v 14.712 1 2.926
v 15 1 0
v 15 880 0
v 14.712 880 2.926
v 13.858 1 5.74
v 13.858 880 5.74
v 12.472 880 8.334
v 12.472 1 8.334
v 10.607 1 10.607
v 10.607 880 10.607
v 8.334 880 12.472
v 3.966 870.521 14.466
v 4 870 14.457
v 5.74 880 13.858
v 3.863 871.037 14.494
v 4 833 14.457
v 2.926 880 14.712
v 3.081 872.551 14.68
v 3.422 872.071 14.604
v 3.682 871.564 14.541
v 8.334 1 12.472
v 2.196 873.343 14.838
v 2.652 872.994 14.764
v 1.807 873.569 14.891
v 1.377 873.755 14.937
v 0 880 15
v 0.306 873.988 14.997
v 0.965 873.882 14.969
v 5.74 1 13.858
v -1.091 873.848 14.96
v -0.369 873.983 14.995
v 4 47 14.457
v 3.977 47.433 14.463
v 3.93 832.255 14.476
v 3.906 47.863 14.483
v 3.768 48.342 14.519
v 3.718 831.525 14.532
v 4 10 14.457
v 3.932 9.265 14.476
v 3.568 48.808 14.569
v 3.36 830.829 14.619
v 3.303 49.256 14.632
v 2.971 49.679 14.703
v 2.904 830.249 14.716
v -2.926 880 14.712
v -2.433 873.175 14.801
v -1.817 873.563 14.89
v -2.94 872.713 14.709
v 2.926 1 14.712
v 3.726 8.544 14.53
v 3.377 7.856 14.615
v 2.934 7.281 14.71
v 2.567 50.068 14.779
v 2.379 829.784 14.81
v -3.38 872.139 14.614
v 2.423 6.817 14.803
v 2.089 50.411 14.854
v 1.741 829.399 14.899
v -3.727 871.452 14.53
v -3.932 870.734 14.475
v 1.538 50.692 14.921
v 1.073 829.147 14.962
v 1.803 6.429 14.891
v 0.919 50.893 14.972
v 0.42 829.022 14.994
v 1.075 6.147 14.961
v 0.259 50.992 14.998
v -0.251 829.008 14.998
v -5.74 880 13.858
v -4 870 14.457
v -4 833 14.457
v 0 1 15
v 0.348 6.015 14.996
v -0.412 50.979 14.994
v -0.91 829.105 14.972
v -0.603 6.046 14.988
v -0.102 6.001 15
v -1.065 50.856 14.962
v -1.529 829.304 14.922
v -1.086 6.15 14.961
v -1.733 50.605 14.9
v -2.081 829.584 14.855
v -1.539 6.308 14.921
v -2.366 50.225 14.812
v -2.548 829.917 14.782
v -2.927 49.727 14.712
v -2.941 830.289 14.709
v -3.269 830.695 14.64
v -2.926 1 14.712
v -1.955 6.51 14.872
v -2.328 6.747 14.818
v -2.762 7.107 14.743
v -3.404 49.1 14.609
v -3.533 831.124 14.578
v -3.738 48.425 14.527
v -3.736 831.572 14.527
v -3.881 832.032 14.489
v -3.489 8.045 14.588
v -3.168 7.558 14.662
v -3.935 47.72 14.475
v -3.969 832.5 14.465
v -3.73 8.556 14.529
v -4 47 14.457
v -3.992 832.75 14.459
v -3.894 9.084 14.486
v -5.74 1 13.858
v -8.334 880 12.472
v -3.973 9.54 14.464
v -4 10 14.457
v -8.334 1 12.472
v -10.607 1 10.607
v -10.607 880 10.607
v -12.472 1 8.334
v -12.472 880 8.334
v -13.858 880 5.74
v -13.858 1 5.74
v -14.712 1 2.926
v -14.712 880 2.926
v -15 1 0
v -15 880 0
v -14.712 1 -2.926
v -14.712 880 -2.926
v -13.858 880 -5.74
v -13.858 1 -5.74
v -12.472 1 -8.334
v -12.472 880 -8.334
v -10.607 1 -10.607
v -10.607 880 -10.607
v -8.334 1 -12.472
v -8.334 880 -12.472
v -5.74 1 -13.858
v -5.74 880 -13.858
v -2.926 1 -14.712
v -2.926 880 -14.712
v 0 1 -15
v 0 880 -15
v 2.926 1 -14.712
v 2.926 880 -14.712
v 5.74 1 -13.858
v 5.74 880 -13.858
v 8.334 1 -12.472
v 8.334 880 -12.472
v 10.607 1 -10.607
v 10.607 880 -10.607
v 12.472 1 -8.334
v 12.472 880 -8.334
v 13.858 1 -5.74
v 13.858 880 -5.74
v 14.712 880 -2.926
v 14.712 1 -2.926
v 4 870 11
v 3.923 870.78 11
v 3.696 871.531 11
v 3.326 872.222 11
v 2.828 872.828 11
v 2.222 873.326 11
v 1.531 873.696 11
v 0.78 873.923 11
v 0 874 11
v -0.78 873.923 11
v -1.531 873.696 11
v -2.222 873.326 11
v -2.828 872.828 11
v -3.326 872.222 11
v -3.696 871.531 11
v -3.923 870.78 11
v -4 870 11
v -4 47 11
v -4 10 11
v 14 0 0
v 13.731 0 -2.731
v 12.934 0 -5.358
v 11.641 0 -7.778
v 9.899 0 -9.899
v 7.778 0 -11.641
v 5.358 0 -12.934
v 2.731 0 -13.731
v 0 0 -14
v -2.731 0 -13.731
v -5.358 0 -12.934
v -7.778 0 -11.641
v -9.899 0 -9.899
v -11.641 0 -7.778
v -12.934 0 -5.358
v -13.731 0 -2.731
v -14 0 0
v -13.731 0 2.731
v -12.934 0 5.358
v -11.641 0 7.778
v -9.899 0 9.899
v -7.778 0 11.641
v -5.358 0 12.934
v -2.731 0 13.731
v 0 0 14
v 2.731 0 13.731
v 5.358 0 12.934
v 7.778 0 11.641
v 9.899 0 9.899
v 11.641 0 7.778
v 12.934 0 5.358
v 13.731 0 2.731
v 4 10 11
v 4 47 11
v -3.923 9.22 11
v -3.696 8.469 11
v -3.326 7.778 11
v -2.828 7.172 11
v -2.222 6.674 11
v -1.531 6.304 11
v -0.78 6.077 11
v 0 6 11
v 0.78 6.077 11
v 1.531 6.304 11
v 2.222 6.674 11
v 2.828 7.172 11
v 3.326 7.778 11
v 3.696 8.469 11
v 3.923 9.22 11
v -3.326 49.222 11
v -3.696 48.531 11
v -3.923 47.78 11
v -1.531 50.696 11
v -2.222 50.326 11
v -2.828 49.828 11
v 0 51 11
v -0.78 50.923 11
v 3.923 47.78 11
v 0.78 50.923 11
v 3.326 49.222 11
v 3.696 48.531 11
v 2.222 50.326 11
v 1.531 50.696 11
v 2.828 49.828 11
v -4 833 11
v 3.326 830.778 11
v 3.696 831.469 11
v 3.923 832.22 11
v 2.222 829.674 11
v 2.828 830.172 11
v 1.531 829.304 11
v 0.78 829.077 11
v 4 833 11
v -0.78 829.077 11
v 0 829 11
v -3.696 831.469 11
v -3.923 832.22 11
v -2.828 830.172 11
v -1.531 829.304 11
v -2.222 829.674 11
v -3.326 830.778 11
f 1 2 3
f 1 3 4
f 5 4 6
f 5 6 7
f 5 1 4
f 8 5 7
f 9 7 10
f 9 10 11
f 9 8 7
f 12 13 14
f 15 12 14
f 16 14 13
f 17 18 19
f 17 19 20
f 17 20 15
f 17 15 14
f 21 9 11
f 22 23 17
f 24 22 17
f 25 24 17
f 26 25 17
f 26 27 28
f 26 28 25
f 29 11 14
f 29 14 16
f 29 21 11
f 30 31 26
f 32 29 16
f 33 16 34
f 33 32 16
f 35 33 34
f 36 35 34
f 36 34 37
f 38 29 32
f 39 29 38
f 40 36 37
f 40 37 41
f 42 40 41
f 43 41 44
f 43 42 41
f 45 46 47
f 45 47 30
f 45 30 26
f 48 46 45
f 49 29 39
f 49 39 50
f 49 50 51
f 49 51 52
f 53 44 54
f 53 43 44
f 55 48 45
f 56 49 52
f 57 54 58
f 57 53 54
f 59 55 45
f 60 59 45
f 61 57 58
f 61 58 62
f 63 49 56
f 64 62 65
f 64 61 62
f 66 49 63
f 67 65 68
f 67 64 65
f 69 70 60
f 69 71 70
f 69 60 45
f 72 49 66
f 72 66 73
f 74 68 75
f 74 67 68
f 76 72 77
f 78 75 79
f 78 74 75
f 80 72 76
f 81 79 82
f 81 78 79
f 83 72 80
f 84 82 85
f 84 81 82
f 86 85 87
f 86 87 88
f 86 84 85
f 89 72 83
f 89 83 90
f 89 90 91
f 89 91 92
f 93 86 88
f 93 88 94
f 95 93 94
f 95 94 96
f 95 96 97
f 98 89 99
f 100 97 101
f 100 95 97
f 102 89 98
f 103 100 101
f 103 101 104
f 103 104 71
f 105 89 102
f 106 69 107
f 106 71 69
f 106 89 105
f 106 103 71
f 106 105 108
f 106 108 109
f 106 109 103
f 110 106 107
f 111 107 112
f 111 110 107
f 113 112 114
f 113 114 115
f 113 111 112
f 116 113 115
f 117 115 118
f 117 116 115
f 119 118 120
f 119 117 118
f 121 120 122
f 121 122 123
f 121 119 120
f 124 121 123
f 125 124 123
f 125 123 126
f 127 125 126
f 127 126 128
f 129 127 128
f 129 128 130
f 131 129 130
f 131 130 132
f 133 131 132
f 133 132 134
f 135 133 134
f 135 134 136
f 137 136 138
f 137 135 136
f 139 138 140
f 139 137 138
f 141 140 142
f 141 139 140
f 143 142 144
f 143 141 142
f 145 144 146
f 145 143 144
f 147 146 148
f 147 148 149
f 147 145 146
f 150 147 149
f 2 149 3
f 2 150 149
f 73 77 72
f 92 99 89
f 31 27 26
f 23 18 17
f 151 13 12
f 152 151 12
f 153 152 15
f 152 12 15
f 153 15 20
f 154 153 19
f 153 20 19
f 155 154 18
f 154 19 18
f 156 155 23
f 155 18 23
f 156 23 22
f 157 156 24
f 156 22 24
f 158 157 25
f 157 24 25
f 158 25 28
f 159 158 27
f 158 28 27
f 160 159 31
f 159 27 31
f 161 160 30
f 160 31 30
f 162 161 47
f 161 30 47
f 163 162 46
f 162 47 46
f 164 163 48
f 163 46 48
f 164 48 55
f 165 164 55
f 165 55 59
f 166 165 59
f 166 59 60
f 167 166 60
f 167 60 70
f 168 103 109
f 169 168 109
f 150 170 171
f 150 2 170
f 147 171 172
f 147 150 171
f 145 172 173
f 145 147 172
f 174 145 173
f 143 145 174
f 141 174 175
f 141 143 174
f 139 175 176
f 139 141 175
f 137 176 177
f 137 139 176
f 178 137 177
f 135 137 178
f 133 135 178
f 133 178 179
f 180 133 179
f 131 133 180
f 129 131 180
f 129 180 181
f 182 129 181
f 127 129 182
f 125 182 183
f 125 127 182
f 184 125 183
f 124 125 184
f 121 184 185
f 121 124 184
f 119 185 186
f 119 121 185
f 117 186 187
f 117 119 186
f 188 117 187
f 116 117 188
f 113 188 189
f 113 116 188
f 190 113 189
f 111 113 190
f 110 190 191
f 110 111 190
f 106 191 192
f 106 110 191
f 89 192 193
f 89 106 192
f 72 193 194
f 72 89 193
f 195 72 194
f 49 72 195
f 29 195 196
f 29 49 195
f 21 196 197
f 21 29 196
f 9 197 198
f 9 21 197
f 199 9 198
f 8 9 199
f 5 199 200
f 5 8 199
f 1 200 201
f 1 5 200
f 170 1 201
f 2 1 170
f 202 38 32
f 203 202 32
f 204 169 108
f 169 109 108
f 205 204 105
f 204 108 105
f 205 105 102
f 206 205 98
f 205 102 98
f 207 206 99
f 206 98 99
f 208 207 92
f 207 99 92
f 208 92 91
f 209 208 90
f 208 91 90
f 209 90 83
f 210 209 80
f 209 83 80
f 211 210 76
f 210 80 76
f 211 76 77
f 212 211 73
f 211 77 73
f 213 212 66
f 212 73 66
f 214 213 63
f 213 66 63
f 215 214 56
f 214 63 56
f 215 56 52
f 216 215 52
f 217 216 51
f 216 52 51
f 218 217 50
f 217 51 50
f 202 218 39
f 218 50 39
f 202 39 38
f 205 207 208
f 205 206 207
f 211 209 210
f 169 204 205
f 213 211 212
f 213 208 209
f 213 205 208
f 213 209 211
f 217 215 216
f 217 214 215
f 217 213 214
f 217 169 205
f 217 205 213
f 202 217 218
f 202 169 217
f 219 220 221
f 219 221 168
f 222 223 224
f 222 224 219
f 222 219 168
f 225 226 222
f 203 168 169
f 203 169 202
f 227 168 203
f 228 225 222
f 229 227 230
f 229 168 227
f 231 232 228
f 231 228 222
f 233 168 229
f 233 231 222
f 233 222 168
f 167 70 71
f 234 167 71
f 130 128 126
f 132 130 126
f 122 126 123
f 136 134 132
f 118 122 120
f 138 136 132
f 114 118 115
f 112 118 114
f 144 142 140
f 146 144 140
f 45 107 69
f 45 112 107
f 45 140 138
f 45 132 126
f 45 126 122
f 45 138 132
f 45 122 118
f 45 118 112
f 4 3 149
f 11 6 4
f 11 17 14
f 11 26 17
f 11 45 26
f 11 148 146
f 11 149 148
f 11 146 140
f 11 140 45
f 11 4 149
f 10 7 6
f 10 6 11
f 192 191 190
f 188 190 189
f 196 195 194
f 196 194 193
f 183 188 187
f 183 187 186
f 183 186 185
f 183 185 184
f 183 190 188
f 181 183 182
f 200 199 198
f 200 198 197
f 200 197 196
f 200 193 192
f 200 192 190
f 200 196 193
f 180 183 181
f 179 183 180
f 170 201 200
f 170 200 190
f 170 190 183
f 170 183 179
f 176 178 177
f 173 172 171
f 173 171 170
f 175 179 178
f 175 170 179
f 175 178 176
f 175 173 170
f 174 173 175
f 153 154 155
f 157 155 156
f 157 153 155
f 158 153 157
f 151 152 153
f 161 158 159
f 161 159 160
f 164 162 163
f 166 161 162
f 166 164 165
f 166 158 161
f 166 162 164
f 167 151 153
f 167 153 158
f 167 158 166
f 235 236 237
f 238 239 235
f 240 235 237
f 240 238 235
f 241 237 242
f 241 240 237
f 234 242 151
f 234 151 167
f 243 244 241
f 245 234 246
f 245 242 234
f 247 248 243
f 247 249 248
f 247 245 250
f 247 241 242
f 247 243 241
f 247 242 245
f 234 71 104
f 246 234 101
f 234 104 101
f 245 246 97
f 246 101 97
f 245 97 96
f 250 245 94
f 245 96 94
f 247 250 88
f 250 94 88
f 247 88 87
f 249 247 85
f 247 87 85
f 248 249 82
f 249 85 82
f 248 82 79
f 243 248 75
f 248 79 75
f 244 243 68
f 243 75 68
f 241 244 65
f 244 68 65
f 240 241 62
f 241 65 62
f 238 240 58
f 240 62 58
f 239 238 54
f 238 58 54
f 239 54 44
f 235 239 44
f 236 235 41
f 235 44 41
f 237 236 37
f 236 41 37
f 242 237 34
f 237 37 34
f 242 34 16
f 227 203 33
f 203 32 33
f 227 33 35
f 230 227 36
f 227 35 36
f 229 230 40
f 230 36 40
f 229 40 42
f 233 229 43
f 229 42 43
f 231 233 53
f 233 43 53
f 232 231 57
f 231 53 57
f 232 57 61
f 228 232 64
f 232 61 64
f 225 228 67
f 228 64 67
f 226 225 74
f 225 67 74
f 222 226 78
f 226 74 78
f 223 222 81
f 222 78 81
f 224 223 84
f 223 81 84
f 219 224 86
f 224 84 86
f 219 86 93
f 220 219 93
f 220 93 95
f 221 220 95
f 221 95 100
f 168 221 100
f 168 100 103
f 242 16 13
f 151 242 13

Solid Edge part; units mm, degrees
sketch "Sketch1" plane through (10.8674, 0, 10.8674) normal (0, -1, 0) x (1, 0, 0)
  circle A0 centre (-10.8674, -10.8674) radius 15
extrude "Protrusion1" add sketch "Sketch1" against normal blind 440
chamfer "Chamfer" distance 1 angle 45 1 edges at (-15, 0, 0)
sketch "Sketch2" plane through (0, 220.5, 15) normal (0, 0, 1) x (0, -1, 0)
  line L0 (173.5, -4) -> (210.5, -4)
  arc A0 (210.5, 4) -> (210.5, -4) centre (210.5, 0) cw
  line L1 (210.5, 4) -> (173.5, 4)
  arc A1 (173.5, 4) -> (173.5, -4) centre (173.5, 0) ccw
  dimension "D1" = 8
  dimension "D2" = 10
extrude "KeySlot_Wheel_Hub" cut sketch "Sketch2" against normal blind 4
mirror "Mirror1" about plane through (0, 440, 0) normal (0, 1, 0) of "Protrusion1", "KeySlot_Wheel_Hub"
properties material "Steel"
